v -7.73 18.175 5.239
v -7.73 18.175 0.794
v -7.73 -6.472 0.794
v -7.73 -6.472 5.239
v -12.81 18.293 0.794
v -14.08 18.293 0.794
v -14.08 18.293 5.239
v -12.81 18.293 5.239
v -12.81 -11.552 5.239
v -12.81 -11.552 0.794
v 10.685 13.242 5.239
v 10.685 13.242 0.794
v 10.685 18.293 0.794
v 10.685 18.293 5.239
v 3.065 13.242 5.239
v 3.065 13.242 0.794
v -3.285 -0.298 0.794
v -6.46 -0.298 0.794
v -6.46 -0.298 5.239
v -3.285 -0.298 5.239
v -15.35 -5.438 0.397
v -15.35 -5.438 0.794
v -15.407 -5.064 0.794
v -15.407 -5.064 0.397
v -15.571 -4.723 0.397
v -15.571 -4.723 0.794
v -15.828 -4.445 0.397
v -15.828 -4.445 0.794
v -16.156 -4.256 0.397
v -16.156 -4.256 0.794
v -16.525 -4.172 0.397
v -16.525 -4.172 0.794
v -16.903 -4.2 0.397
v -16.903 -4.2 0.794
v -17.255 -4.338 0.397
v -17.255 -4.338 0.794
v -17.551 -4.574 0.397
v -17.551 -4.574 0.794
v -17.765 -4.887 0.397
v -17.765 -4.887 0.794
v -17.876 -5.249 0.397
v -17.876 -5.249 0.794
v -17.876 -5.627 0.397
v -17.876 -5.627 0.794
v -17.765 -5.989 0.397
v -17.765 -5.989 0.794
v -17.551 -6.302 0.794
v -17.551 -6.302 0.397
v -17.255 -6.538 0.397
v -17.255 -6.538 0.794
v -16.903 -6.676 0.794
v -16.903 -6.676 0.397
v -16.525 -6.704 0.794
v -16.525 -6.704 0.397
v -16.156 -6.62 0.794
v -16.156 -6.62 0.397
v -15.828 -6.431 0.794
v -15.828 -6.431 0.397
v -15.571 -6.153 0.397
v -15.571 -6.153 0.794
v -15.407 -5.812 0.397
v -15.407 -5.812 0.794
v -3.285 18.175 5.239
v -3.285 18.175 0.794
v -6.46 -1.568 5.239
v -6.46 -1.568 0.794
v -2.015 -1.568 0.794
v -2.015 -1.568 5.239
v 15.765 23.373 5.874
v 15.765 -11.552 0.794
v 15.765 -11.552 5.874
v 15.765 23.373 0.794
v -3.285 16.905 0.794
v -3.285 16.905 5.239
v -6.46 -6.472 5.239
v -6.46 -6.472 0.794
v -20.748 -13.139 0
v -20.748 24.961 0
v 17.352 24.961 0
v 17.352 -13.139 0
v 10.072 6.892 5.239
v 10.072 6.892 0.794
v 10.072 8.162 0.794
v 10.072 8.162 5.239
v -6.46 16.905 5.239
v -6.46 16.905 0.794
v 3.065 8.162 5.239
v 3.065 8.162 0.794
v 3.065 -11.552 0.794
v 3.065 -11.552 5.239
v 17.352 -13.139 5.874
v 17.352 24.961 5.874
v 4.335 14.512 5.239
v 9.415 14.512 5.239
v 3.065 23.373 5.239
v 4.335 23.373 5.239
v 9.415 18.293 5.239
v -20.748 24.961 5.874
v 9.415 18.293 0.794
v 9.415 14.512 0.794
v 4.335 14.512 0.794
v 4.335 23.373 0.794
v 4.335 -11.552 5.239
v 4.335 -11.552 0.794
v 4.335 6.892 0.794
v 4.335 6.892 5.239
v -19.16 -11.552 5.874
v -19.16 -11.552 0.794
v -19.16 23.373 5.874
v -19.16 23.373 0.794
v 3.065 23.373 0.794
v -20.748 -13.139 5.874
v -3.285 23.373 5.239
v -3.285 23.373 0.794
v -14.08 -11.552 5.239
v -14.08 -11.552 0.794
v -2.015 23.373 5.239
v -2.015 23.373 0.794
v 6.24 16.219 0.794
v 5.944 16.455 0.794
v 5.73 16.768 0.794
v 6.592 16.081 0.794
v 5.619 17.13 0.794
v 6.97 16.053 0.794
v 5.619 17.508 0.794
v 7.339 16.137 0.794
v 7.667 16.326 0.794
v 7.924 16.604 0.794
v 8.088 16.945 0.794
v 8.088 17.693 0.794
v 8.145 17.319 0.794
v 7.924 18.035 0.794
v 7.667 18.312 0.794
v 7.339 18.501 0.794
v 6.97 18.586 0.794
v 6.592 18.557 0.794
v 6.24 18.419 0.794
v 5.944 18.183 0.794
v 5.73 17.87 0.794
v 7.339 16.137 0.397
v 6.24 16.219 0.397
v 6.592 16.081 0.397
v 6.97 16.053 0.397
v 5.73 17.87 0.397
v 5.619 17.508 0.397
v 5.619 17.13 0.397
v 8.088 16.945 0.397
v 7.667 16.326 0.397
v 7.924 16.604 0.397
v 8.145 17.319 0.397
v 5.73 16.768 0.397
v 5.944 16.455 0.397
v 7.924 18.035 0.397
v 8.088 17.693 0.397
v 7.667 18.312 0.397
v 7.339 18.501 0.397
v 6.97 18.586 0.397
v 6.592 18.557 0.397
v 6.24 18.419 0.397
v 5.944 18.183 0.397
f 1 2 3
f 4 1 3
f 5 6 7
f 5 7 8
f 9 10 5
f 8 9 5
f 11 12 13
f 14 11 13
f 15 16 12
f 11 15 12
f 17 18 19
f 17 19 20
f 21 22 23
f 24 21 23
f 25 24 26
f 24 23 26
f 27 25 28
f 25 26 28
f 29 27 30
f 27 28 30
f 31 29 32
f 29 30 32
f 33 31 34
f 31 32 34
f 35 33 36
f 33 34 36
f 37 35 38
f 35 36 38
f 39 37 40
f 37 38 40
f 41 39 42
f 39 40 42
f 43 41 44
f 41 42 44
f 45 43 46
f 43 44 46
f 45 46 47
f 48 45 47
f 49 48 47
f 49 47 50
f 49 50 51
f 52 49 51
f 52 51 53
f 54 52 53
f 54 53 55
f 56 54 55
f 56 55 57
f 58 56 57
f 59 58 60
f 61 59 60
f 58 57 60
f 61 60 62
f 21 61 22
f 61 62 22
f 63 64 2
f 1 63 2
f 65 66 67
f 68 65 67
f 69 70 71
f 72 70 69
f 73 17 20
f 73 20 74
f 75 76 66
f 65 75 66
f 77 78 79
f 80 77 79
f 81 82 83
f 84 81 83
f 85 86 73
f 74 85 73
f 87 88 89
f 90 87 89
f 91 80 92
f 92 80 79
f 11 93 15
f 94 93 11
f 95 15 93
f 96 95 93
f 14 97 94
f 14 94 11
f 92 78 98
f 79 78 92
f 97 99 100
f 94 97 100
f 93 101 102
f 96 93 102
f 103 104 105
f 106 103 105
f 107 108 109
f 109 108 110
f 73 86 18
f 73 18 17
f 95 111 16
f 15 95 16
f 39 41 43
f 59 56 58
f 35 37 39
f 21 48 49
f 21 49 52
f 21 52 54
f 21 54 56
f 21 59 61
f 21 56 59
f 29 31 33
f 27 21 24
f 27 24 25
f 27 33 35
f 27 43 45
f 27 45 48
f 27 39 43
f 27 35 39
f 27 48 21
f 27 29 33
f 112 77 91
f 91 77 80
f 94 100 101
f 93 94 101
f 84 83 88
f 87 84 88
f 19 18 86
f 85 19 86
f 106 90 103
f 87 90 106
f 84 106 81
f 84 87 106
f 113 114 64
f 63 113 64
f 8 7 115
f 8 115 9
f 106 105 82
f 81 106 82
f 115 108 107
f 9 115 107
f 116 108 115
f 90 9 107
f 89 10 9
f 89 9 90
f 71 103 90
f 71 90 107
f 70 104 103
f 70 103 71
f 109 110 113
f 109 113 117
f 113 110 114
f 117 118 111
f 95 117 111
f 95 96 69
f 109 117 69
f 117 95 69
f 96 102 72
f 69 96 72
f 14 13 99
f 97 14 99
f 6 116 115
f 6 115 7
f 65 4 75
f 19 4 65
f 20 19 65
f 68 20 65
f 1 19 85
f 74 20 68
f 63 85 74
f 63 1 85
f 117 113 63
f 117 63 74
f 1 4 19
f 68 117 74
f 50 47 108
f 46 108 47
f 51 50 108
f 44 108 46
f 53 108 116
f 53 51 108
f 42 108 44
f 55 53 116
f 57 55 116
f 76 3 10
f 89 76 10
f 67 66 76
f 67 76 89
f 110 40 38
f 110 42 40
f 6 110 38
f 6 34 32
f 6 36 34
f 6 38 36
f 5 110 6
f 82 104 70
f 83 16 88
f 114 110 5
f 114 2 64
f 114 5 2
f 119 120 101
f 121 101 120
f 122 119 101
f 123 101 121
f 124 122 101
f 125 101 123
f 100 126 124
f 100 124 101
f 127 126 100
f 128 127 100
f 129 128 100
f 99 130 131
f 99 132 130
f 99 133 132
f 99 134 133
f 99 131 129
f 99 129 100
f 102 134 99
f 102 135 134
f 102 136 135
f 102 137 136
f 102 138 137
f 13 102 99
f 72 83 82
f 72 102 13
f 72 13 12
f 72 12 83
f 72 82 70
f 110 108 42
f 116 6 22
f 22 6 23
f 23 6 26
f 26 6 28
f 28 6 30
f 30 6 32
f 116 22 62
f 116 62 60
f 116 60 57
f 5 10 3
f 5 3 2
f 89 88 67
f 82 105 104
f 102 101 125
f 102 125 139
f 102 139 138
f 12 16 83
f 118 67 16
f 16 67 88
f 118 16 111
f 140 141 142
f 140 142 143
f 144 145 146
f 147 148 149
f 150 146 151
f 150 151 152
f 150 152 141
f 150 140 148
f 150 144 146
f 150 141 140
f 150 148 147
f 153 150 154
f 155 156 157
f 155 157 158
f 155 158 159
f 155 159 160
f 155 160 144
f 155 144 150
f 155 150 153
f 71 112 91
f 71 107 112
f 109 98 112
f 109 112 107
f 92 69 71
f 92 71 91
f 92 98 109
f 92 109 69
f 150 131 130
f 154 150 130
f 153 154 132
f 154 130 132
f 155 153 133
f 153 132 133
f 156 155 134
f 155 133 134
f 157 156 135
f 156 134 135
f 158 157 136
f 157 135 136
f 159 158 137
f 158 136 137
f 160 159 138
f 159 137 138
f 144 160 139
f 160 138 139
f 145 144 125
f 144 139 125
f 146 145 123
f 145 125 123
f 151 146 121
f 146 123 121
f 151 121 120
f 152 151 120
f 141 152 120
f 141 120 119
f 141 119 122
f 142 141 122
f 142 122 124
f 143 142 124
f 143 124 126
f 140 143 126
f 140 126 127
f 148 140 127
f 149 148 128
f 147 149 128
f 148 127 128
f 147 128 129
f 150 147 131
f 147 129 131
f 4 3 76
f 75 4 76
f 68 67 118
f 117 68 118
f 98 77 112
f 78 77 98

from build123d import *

# Parameters (mm, degrees)
F0_W     = 38.1
F0_H     = 38.1
F1_DEPTH = 0.79375
F2_W     = 38.1
F2_H     = 38.1
F2_W_2   = 34.925
F2_H_2   = 34.925
F3_DEPTH = 5.08
F4_R     = 1.27
F5_DEPTH = 0.396875
F4_W     = 1.27
F4_H     = 29.845
F4_W_2   = 3.175
F4_H_2   = 17.203249
F6_DEPTH = 4.445


with BuildPart() as f1:
    # F0 (on Top) → F1 (new body)
    with BuildSketch(Plane.XY):
        with Locations((-1.697784, 5.910519)):
            Rectangle(F0_W, F0_H)
    extrude(amount=F1_DEPTH)

    # F2 (on face) → F3 (join)
    with BuildSketch(Plane.XY.offset(0.79375)):
        with Locations((-1.697784, 5.910519)):
            Rectangle(F2_W, F2_H)
        with Locations((-1.697784, 5.910519)):
            Rectangle(F2_W_2, F2_H_2, mode=Mode.SUBTRACT)
    extrude(amount=F3_DEPTH)

    # F4 (on face) → F5 (cut)
    with BuildSketch(Plane.XY.offset(0.79375)):
        with Locations((-16.620284, -5.438046)):
            Circle(F4_R)
        with Locations((6.874716, 17.319087)):
            Circle(F4_R)
    extrude(amount=-F5_DEPTH, mode=Mode.SUBTRACT)

    # F4 (on face) → F6 (join)
    with BuildSketch(Plane.XY.offset(0.79375)):
        with Locations((-13.445284, 3.370519)):
            Rectangle(F4_W, F4_H)
        Polygon((-2.015284, 23.373019), (-3.285284, 23.373019), (-3.285284, 18.175395), (-6.460284, 18.175395), (-7.730284, 18.175395), (-7.730284, -6.471981), (-6.460284, -6.471981), (-6.460284, -1.567854), (-3.285284, -1.567854), (-2.015284, -1.567854), (-2.015284, 16.905395), (-2.015284, 18.175395), align=None)
        with Locations((-4.872784, 8.30377)):
            Rectangle(F4_W_2, F4_H_2, mode=Mode.SUBTRACT)
        Polygon((3.064716, 8.161802), (3.064716, -11.551981), (4.334716, -11.551981), (4.334716, 6.891802), (10.071768, 6.891802), (10.071768, 8.161802), (4.334716, 8.161802), align=None)
        Polygon((3.386088, 23.373019), (3.064716, 23.373019), (3.064716, 13.241802), (4.334716, 13.241802), (10.684716, 13.241802), (10.684716, 14.511802), (10.684716, 18.293019), (9.414716, 18.293019), (9.414716, 14.511802), (4.334716, 14.511802), (4.334716, 23.373019), align=None)
    extrude(amount=F6_DEPTH)


solid = f1.part
